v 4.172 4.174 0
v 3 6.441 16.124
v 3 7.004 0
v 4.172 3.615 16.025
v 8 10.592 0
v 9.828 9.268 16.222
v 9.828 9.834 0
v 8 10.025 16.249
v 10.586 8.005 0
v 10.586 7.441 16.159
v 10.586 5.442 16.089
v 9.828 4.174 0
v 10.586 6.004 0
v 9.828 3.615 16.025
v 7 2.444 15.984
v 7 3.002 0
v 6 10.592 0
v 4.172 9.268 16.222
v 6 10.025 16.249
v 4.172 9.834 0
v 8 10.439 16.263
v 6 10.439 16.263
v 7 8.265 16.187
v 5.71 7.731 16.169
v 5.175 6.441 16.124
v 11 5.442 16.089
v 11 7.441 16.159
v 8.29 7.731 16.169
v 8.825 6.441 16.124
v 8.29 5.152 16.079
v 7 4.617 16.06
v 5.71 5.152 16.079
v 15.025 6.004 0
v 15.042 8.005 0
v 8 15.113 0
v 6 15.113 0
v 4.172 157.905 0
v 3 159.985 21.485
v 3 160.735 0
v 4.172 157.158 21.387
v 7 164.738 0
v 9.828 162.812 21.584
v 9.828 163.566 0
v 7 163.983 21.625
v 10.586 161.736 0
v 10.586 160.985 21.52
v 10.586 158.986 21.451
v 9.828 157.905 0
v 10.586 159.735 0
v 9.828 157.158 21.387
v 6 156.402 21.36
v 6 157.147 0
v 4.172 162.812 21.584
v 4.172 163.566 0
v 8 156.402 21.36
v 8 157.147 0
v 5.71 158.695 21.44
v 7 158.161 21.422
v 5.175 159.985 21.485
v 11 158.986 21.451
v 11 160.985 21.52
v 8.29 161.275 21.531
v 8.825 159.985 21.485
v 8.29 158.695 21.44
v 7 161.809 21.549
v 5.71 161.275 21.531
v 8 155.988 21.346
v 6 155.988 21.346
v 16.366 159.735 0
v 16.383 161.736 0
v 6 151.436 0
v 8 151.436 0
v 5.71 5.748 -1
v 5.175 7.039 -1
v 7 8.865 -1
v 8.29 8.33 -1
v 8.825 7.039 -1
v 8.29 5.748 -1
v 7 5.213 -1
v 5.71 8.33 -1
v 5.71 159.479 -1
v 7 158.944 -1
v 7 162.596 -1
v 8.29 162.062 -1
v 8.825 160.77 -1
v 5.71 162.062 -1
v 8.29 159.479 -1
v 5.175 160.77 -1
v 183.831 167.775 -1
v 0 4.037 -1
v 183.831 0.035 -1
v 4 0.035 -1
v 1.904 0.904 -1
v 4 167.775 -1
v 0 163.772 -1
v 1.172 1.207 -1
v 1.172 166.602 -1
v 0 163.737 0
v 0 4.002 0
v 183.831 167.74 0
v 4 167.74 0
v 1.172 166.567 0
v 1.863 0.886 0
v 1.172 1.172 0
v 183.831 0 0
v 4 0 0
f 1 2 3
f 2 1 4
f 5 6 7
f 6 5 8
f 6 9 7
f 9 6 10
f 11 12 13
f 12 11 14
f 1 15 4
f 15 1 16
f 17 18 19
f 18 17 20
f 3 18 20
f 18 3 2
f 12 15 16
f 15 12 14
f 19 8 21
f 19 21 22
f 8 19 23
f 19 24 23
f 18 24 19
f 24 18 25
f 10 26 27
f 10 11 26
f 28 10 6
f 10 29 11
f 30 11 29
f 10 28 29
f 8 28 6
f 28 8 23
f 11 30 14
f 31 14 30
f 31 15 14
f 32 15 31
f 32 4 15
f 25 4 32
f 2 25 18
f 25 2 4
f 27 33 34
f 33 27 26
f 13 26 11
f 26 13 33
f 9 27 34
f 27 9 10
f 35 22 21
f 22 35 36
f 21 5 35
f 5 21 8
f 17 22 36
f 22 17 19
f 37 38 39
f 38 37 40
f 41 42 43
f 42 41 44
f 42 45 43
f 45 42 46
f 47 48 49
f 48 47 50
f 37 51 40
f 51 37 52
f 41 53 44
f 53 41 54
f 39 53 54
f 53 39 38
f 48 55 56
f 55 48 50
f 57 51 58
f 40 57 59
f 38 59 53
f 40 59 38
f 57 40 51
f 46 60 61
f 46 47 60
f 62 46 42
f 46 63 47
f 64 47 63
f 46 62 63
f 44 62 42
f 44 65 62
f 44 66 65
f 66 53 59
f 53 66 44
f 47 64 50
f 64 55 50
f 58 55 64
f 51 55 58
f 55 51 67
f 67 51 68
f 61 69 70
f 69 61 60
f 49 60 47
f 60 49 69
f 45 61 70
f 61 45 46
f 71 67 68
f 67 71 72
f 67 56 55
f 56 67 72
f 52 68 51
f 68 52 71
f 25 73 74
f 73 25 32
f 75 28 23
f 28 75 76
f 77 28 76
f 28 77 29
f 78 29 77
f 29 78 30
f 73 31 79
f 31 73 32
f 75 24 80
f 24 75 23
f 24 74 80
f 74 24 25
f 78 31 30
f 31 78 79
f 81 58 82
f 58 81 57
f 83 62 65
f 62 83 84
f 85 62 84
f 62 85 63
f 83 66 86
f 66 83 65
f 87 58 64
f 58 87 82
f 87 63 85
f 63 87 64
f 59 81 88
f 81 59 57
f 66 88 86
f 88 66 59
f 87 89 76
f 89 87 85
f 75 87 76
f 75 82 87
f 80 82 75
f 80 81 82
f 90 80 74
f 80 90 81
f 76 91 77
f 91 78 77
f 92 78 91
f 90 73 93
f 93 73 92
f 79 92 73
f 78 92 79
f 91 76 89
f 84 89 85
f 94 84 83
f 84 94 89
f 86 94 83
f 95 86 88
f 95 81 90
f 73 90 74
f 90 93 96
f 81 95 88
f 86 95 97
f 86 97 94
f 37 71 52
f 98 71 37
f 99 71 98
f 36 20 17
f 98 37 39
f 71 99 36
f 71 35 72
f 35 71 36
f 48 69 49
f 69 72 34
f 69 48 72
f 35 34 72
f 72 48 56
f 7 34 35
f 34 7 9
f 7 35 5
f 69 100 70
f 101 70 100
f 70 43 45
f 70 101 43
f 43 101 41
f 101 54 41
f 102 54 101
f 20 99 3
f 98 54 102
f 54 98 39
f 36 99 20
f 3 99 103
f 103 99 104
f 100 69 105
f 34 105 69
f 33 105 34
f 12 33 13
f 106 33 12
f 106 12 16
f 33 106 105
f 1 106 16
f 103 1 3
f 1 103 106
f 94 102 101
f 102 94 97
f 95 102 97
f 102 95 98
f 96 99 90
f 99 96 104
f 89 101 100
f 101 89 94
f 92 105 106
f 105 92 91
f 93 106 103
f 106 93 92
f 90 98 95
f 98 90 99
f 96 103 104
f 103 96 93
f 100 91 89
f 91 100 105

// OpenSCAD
// Generated by SolidPython 1.1.3 on 2024-07-24 01:23:33
$fn = 8;


difference() {
	intersection() {
		union() {
			difference() {
				rotate(a = 2.0000000000, v = [1, 0, 0]) {
					translate(v = [0, 0, 16.4445000000]) {
						translate(v = [0, 157.6375000000, 0]) {
							translate(v = [10, 0, 0]) {
								difference() {
									translate(v = [-3, 0, 0]) {
										translate(v = [0, -150.6375000000, 0]) {
											translate(v = [0, 0, -68.5555000000]) {
												union() {
													translate(v = [0, 0, 0]) {
														translate(v = [0, 0, 0]) {
															union() {
																cylinder(h = 68, r = 4.0000000000);
																rotate(a = 90, v = [1, 0, 0]) {
																	linear_extrude(center = true, height = 2) {
																		polygon(paths = [[0, 1, 2, 3]], points = [[0, 0], [0, 68], [4.0000000000, 68], [21.0000000000, 0]]);
																	}
																}
																rotate(a = 90, v = [0, 0, 1]) {
																	rotate(a = 90, v = [1, 0, 0]) {
																		linear_extrude(center = true, height = 2) {
																			polygon(paths = [[0, 1, 2, 3]], points = [[0, 0], [0, 68], [4.0000000000, 68], [21.0000000000, 0]]);
																		}
																	}
																}
															}
														}
													}
													translate(v = [0, 0, 0]) {
														translate(v = [0, 153.6375000000, 0]) {
															union() {
																cylinder(h = 68, r = 4.0000000000);
																rotate(a = 90, v = [1, 0, 0]) {
																	linear_extrude(center = true, height = 2) {
																		polygon(paths = [[0, 1, 2, 3]], points = [[0, 0], [0, 68], [4.0000000000, 68], [21.0000000000, 0]]);
																	}
																}
																rotate(a = 270, v = [0, 0, 1]) {
																	rotate(a = 90, v = [1, 0, 0]) {
																		linear_extrude(center = true, height = 2) {
																			polygon(paths = [[0, 1, 2, 3]], points = [[0, 0], [0, 68], [4.0000000000, 68], [21.0000000000, 0]]);
																		}
																	}
																}
															}
														}
													}
													translate(v = [353.6625000000, 0, 0]) {
														translate(v = [0, 153.6375000000, 0]) {
															union() {
																cylinder(h = 68, r = 4.0000000000);
																rotate(a = 180, v = [0, 0, 1]) {
																	rotate(a = 90, v = [1, 0, 0]) {
																		linear_extrude(center = true, height = 2) {
																			polygon(paths = [[0, 1, 2, 3]], points = [[0, 0], [0, 68], [4.0000000000, 68], [21.0000000000, 0]]);
																		}
																	}
																}
																rotate(a = 270, v = [0, 0, 1]) {
																	rotate(a = 90, v = [1, 0, 0]) {
																		linear_extrude(center = true, height = 2) {
																			polygon(paths = [[0, 1, 2, 3]], points = [[0, 0], [0, 68], [4.0000000000, 68], [21.0000000000, 0]]);
																		}
																	}
																}
															}
														}
													}
													translate(v = [353.6625000000, 0, 0]) {
														translate(v = [0, 0, 0]) {
															union() {
																cylinder(h = 68, r = 4.0000000000);
																rotate(a = 180, v = [0, 0, 1]) {
																	rotate(a = 90, v = [1, 0, 0]) {
																		linear_extrude(center = true, height = 2) {
																			polygon(paths = [[0, 1, 2, 3]], points = [[0, 0], [0, 68], [4.0000000000, 68], [21.0000000000, 0]]);
																		}
																	}
																}
																rotate(a = 90, v = [0, 0, 1]) {
																	rotate(a = 90, v = [1, 0, 0]) {
																		linear_extrude(center = true, height = 2) {
																			polygon(paths = [[0, 1, 2, 3]], points = [[0, 0], [0, 68], [4.0000000000, 68], [21.0000000000, 0]]);
																		}
																	}
																}
															}
														}
													}
												}
											}
										}
									}
									translate(v = [-3, 0, 0]) {
										translate(v = [0, -150.6375000000, 0]) {
											union() {
												translate(v = [0, 0, 0]) {
													translate(v = [0, 0, 0]) {
														cylinder(center = true, h = 272, r = 1.8250000000);
													}
												}
												translate(v = [0, 0, 0]) {
													translate(v = [0, 153.6375000000, 0]) {
														cylinder(center = true, h = 272, r = 1.8250000000);
													}
												}
												translate(v = [353.6625000000, 0, 0]) {
													translate(v = [0, 153.6375000000, 0]) {
														cylinder(center = true, h = 272, r = 1.8250000000);
													}
												}
												translate(v = [353.6625000000, 0, 0]) {
													translate(v = [0, 0, 0]) {
														cylinder(center = true, h = 272, r = 1.8250000000);
													}
												}
											}
										}
									}
								}
							}
						}
					}
				}
				translate(v = [0, 0, -1]) {
					translate(v = [0, 0, -100]) {
						translate(v = [0, -83.8187500000, 0]) {
							translate(v = [-183.8312500000, 0, 0]) {
								cube(size = [735.3250000000, 335.2750000000, 100]);
							}
						}
					}
				}
			}
			intersection() {
				translate(v = [0, 0, -1]) {
					translate(v = [-183.8312500000, 0, 0]) {
						translate(v = [0, -83.8187500000, 0]) {
							cube(size = [735.3250000000, 335.2750000000, 1]);
						}
					}
				}
				rotate(a = 2.0000000000, v = [1, 0, 0]) {
					translate(v = [0, 0, 16.4445000000]) {
						translate(v = [0, 157.6375000000, 0]) {
							translate(v = [10, 0, 0]) {
								translate(v = [0, 0, -34.0000000000]) {
									translate(v = [173.8312500000, 0, 0]) {
										translate(v = [0, -73.8187500000, 0]) {
											minkowski() {
												cube(center = true, size = [359.6625000000, 159.6375000000, 68]);
												cylinder(center = true, h = 0.5555000000, r = 4);
											}
										}
									}
								}
							}
						}
					}
				}
			}
		}
		translate(v = [0, 0, 16.4445000000]) {
			translate(v = [0, 157.6375000000, 0]) {
				translate(v = [10, 0, 0]) {
					translate(v = [-10.0000000000, 0, 0]) {
						translate(v = [0, -251.4562500000, 0]) {
							translate(v = [0, 0, -34.0000000000]) {
								cube(size = [183.8312500000, 335.2750000000, 136]);
							}
						}
					}
				}
			}
		}
	}
	rotate(a = 2.0000000000, v = [1, 0, 0]) {
		translate(v = [0, 0, 16.4445000000]) {
			translate(v = [0, 157.6375000000, 0]) {
				translate(v = [10, 0, 0]) {
					translate(v = [-3, 0, 0]) {
						translate(v = [0, -150.6375000000, 0]) {
							union() {
								translate(v = [0, 0, 0]) {
									translate(v = [0, 0, 0]) {
										cylinder(center = true, h = 272, r = 1.8250000000);
									}
								}
								translate(v = [0, 0, 0]) {
									translate(v = [0, 153.6375000000, 0]) {
										cylinder(center = true, h = 272, r = 1.8250000000);
									}
								}
								translate(v = [353.6625000000, 0, 0]) {
									translate(v = [0, 153.6375000000, 0]) {
										cylinder(center = true, h = 272, r = 1.8250000000);
									}
								}
								translate(v = [353.6625000000, 0, 0]) {
									translate(v = [0, 0, 0]) {
										cylinder(center = true, h = 272, r = 1.8250000000);
									}
								}
							}
						}
					}
				}
			}
		}
	}
}
/***********************************************
*********      SolidPython code:      **********
************************************************
 
#!/usr/bin/env python3

import argparse
from asyncio import subprocess
import json
# import math
import re
import logging
import os
# import os.path
import subprocess
# import time

from solid import *
from solid.utils import *

from parameters import Parameters
from keyboard import Keyboard
from cable import Cable

# Set logger level variables
console_logging_level = logging.WARN
file_logging_level = logging.DEBUG


# Get root logger and set main logger level to DEBUG
logger = logging.getLogger()
logger.setLevel(logging.DEBUG)


# Create formatters
console_formatter = logging.Formatter('%(name)s %(levelname)s: %(funcName)s: [%(lineno)d]: %(message)s')
file_formatter = logging.Formatter('%(asctime)s %(levelname)s %(name)s: %(funcName)s: [%(lineno)d]: %(message)s')

# Create console handler and set level to info
console_handler = logging.StreamHandler()
console_handler.setLevel(console_logging_level)

# Add formatter to console_handler
console_handler.setFormatter(console_formatter)

# Add console handler to logger
logger.addHandler(console_handler)

# Get file info that will be used to creat log file
script_location = Path(os.path.dirname(os.path.realpath(__file__)))
log_file_name = 'generator.log'
log_file_path = script_location / log_file_name

# Create file handler and set level to info
file_handler = logging.FileHandler(log_file_path, mode = 'w')
file_handler.setLevel(file_logging_level)

# Add formatter to file_handler
file_handler.setFormatter(file_formatter)

# Add file handler to logger
logger.addHandler(file_handler)


# Helper for parser to wnsure filename argument has to correct extension
def CheckExt(choices):
    class Act(argparse.Action):
        def __call__(self,parser,namespace,fname,option_string=None):
            ext = os.path.splitext(fname)[1][1:]
            if ext not in choices:
                option_string = '({})'.format(option_string) if option_string else ''
                parser.error("file doesn't end with one of {}{}".format(choices,option_string))
            else:
                setattr(namespace,self.dest,fname)

    return Act



def main():

    parser = argparse.ArgumentParser(description='Build custom keyboard SCAD file using keyboard layout editor format')
    parser.add_argument('-i', '--input-file', metavar = 'layout_json_file_name.json', help = 'A path to a keyboard layout editor json file', required = True, action=CheckExt({'json'}))
    # parser.add_argument('-o', '--output-folder', metavar = 'scad', help = 'A path to a folder to store the generated open scad file')
    parser.add_argument('-p', '--parameter-file', metavar = 'parameters.json', help = 'A JSON file containing paramters for the object buing made', default = None, action=CheckExt({'json'}))
    parser.add_argument('-s', '--section', metavar = 'section_num', help = 'The number of the section that should be built', type = int, default = -1)
    parser.add_argument('-a', '--all-sections', help = 'Output all the parts for all possible sections in separate files', default = False, action = 'store_true')
    parser.add_argument('-e', '--exploded', help = 'Create test file with each section shown as an exploded view', default = False, action = 'store_true')
    parser.add_argument('-f', '--fragments', metavar = 'num_fragments', help = 'The number of fragments to be used when creating curves', type = int, default = 8)
    parser.add_argument('-r', '--render', help = 'Render an STL from the generated scad file', default = False, action = 'store_true')
    parser.add_argument('--switch-type-in-filename', help = 'Add the switch type name and stabilizer type name to the filname', default = False, action = 'store_true')

    # Parse command line arguments
    args = parser.parse_args()
    logger.debug(vars(args))

    # Create Path object from input file argument
    input_file_path = Path(args.input_file)

    # Get base folder path
    base_path = input_file_path.parent

    # Get input file name onle
    file_name_only = input_file_path.name
    
    # Get layout name from file name
    layout_name = input_file_path.stem

    # Generate output scad and stl output folder paths
    output_base_folder = base_path / layout_name
    scad_folder_path = output_base_folder / 'scad'
    stl_folder_path = output_base_folder / 'stl'

    # Ensure all outpur folders exists
    if output_base_folder.is_dir() == False:
        output_base_folder.mkdir()

    if scad_folder_path.is_dir() == False:
        scad_folder_path.mkdir()

    if stl_folder_path.is_dir() == False:
        stl_folder_path.mkdir()

    logger.debug('layout_name: %s', str(layout_name))
    logger.debug('base_path: %s', str(base_path))
    logger.debug('file_name_only: %s', str(file_name_only))
    
    # define output file extensions
    scad_postfix = '.scad'
    stl_postfix  = '.stl'

    # Set fragments per circle
    FRAGMENTS = args.fragments
    logger.debug('\tFragments: %d', FRAGMENTS)

    # Pattern and Replacement strings to be used when trying to turn keyboard-layout-editor raw output into valid JSON
    json_key_pattern = '([{,])([xywha1]+):'
    json_key_replace = '\\1"\\2":'

    # Open JSON layout file
    logger.debug('Open layout file %s', input_file_path)
    try:
        # Try with utf-8 encoding specified
        f = open(input_file_path, encoding="utf-8")
    except:
        # Failed to open
        logger.info('Failed to open layout file with utf-8 encoding specified. Try opening without specifying an encoding')
        try:
            # Try opening with no encoding spcificed
            f = open(input_file_path)
        except:
            logger.error('Failed to open layout file both spefifying utf-8 andcoding and not specifying any encodeing. Exiting')
            exit(1)

    logger.debug('Read layout JSON string from file %s', input_file_path)
    try:
        keyboard_layout = f.read()
    except UnicodeDecodeError:
        logger.error('Unable to decode layout file. Please provide utf-8 encoded files')
        exit(-1)

    keyboard_layout_dict = None

    # Load keyboard layout dictionary
    logger.debug('Parse layout file JSON string')
    try:
        # Attempt to parse to provided JSON string
        keyboard_layout_dict = json.loads(keyboard_layout)
        logger.debug('Valid Json Parsed')
    except:
        # Failed to parse the JSON test.
        # This most likely means that the keybaord-layout-editor raw output was provided
        # Attempt to modify that string to make it valid JSON
        keyboard_layout = '[%s]' % (keyboard_layout)
        keyboard_layout = re.sub(json_key_pattern, json_key_replace, keyboard_layout)
        try:
            keyboard_layout_dict = json.loads(keyboard_layout)
            logger.info('Initial layout Json Invalid. Json modified and parsed')
        except:
            logger.error('Failed to parse layout json after attempt at correction.')
            raise

    logger.debug('keyboard_layout_dict: %s', str(keyboard_layout_dict))


    # Read parameter file
    parameter_dict = None
    if args.parameter_file is not None:
        # Open JSON parameter file
        logger.debug('Open parameter file %s', args.parameter_file)
        try:
            # Try with utf-8 encoding specified
            f = open(args.parameter_file, encoding="utf-8")
        except:
            # Failed to open
            logger.info('Failed to open parameter file with utf-8 encoding specified. Try opening without specifying an encoding')
            try:
                # Try opening with no encoding spcificed
                f = open(args.parameter_fil)
            except:
                logger.error('Failed to open parameter file both spefifying utf-8 andcoding and not specifying any encodeing. Exiting')
                exit(1)
        

        logger.debug('Read JSON string from parameter file %s', args.parameter_file)
        try:
             parameter_file_text = f.read()
        except UnicodeDecodeError:
            logger.error('Unable to decode parameter file. Please provide utf-8 encoded files')
            exit(-1)
       
        logger.debug('Parse parameter JSON string')
        try:
            parameter_dict = json.loads(parameter_file_text)
            logger.debug('Valid Json Parsed')
        except:
            logger.error('Failed to parse parameter JSON file.')
            raise

        logger.debug('parameter_dict: %s', str(parameter_dict))


    # Set parameters from imput file
    parameters = Parameters(parameter_dict)
    
    # Create Keyboard instance
    keyboard = Keyboard(parameters)

    # Process the keyboard layout object
    keyboard.process_keyboard_layout(keyboard_layout_dict)
    keyboard.process_custom_shapes()

    logger.debug('kerf: %f', keyboard.kerf)

    # Dictionary of SolidPython solid objects that need to be rendered to SCAD and to STL if desired
    solid_object_dict = {}

    # Create objects for each of the generated sections
    if args.all_sections == True:
        # Iterate over all sections generated and add all sections to solid_object_dict
        for section in range(keyboard.get_top_section_count()):
            # Set current section for generator
            keyboard.set_section(section)

            # Create dict for section
            solid_object_dict[section] = {}

            # Add top assembly, plate, and all assembly to section dict
            solid_object_dict[section]['top'] = keyboard.get_assembly(top = True)
            solid_object_dict[section]['all'] = keyboard.get_assembly(all = True)
            solid_object_dict[section]['plate'] = keyboard.get_assembly(plate_only = True)

            # If there is a bottom section for the current section add it to section dict
            if section < keyboard.get_bottom_section_count():
                solid_object_dict[section]['bottom'] = keyboard.get_assembly(bottom = True)
            
    # Create exploded object
    elif args.exploded == True:
        solid_object_dict[-1] = {}
        solid_object_dict[-1]['top'] = union()
        solid_object_dict[-1]['plate'] = union()
        solid_object_dict[-1]['bottom'] = union()
        for section in range(keyboard.get_top_section_count()):
            keyboard.set_section(section)
            solid_object_dict[-1]['top'] += up(5 * section) ( right(10 * section) ( keyboard.get_assembly(top = True) ) )
            solid_object_dict[-1]['plate'] += up(5 * section) ( right(10 * section) ( keyboard.get_assembly(plate_only = True) ) )
            if section < keyboard.get_bottom_section_count():
                solid_object_dict[-1]['bottom'] += up(5 * section) ( right(10 * section) ( keyboard.get_assembly(bottom = True) ) )
    

    # Create objects for a specified section
    elif args.section > -1:
        # Set desired section to create
        keyboard.set_section(args.section)

        # Create dict for section
        solid_object_dict[args.section] = {}

        # Add top assembly, plate, and all assembly to section dict
        solid_object_dict[args.section]['top'] = keyboard.get_assembly(top = True)
        solid_object_dict[args.section]['all'] = keyboard.get_assembly(all = True)
        solid_object_dict[args.section]['plate'] = keyboard.get_assembly(plate_only = True)

        # If there is a bottom section for the current section add it to section dict
        if args.section < keyboard.get_bottom_section_count():
            solid_object_dict[args.section]['bottom'] = keyboard.get_assembly(bottom = True)

    # Create an objects that are not split into sections. No other options were specified
    else:
        logger.debug('Create whole object. No other options specified')
        solid_object_dict['all'] = {}
        solid_object_dict['all']['top'] = keyboard.get_assembly(top = True)
        solid_object_dict['all']['bottom'] = keyboard.get_assembly(bottom = True)
        solid_object_dict['all']['all'] = keyboard.get_assembly(all = True)
        solid_object_dict['all']['plate'] = keyboard.get_assembly(plate_only = True)
    
    # Add global items that are not dependant on the sctions or parts of the item to build
    solid_object_dict['global'] = {}

    # Generate a strain relief piece for the cable hole
    if parameters.cable_hole == True:
        cable = Cable(parameters)
        solid_object_dict['global']['cable_holder_main'] = cable.holder_main()
        solid_object_dict['global']['cable_holder_clamp'] = cable.holder_clamp()
        solid_object_dict['global']['cable_holder_all'] = cable.holder_all()

    print(parameters)
    print('Case Height: %f, Case Width: %f\n' % (parameters.real_case_height, parameters.real_case_width))
    
    logger.info('Case Height: %f, Case Width: %f', parameters.real_case_height, parameters.real_case_width)
    logger.info('Sections In Top: %d', keyboard.get_top_section_count())
    logger.info('Sections In Bottom: %d', keyboard.get_bottom_section_count())


    ############################################################
    # Render SCAD and STL files
    ############################################################
    subprocess_dict = {}

    switch_type_for_filename = ''
    stab_type_for_filename = ''

    for section in solid_object_dict.keys():

        if args.switch_type_in_filename == True:
            switch_type_for_filename = '_' + parameters.switch_type
            stab_type_for_filename = '_' + parameters.stabilizer_type

        section_postfix = ''

        # Creating global items that have no relaton to switch type
        if isinstance(section, str) and section == 'global':
            switch_type_for_filename = ''
            stab_type_for_filename = ''
        
        # If the current object dict section is an int greater than -1 add the section number to the filename
        if isinstance(section, int) and section > -1:
            section_postfix = '_section_%d' % (section)
        
        if args.exploded == True:
            section_postfix = '_exploded'

        for part_name in solid_object_dict[section].keys():
            part_name_formatted = '_' + part_name

            scad_file_name = scad_folder_path / (layout_name + section_postfix + part_name_formatted + switch_type_for_filename + stab_type_for_filename + scad_postfix)
            stl_file_name = stl_folder_path / (layout_name + section_postfix + part_name_formatted + switch_type_for_filename + stab_type_for_filename + stl_postfix)

            if solid_object_dict[section][part_name] is not None:
                logger.info('Generate scad file with name %s', scad_file_name)
                # Generate SCAD file from assembly
                scad_render_to_file(solid_object_dict[section][part_name], scad_file_name, file_header=f'$fn = {FRAGMENTS};')
                print('Generated scad file with name', scad_file_name)
                
                # Render STL if option is chosen
                if args.render:
                    logger.debug('Render STL from SCAD')
                    logger.info('Generate stl file with name %s from %s', stl_file_name, scad_file_name)

                    openscad_command_list = ['openscad', '-o', '%s' % (stl_file_name), '%s' % (scad_file_name)]
                    subprocess_dict[stl_file_name] = subprocess.Popen(openscad_command_list)
    
    
    ################################################################
    #  Wait for render processes to complete
    ################################################################
    if args.render:
        logger.debug(subprocess_dict)
        running = True
        while running == True:
            running = False
            for stl_file_name in subprocess_dict.keys():
                p = subprocess_dict[stl_file_name]
                if p is not None:
                    # running = True
                    rcode = None
                    try:
                        rcode = p.wait(.1)
                    except subprocess.TimeoutExpired as err:
                        running = True
                    if rcode is not None:
                        logger.info('Render Complete: file: %s', stl_file_name)
                        print('Render Complete: file:', stl_file_name)
                        subprocess_dict[stl_file_name] = None
            # time.sleep(1)



    logger.info('Generation Complete')

if __name__ == "__main__":
    main()
 
 
************************************************/
